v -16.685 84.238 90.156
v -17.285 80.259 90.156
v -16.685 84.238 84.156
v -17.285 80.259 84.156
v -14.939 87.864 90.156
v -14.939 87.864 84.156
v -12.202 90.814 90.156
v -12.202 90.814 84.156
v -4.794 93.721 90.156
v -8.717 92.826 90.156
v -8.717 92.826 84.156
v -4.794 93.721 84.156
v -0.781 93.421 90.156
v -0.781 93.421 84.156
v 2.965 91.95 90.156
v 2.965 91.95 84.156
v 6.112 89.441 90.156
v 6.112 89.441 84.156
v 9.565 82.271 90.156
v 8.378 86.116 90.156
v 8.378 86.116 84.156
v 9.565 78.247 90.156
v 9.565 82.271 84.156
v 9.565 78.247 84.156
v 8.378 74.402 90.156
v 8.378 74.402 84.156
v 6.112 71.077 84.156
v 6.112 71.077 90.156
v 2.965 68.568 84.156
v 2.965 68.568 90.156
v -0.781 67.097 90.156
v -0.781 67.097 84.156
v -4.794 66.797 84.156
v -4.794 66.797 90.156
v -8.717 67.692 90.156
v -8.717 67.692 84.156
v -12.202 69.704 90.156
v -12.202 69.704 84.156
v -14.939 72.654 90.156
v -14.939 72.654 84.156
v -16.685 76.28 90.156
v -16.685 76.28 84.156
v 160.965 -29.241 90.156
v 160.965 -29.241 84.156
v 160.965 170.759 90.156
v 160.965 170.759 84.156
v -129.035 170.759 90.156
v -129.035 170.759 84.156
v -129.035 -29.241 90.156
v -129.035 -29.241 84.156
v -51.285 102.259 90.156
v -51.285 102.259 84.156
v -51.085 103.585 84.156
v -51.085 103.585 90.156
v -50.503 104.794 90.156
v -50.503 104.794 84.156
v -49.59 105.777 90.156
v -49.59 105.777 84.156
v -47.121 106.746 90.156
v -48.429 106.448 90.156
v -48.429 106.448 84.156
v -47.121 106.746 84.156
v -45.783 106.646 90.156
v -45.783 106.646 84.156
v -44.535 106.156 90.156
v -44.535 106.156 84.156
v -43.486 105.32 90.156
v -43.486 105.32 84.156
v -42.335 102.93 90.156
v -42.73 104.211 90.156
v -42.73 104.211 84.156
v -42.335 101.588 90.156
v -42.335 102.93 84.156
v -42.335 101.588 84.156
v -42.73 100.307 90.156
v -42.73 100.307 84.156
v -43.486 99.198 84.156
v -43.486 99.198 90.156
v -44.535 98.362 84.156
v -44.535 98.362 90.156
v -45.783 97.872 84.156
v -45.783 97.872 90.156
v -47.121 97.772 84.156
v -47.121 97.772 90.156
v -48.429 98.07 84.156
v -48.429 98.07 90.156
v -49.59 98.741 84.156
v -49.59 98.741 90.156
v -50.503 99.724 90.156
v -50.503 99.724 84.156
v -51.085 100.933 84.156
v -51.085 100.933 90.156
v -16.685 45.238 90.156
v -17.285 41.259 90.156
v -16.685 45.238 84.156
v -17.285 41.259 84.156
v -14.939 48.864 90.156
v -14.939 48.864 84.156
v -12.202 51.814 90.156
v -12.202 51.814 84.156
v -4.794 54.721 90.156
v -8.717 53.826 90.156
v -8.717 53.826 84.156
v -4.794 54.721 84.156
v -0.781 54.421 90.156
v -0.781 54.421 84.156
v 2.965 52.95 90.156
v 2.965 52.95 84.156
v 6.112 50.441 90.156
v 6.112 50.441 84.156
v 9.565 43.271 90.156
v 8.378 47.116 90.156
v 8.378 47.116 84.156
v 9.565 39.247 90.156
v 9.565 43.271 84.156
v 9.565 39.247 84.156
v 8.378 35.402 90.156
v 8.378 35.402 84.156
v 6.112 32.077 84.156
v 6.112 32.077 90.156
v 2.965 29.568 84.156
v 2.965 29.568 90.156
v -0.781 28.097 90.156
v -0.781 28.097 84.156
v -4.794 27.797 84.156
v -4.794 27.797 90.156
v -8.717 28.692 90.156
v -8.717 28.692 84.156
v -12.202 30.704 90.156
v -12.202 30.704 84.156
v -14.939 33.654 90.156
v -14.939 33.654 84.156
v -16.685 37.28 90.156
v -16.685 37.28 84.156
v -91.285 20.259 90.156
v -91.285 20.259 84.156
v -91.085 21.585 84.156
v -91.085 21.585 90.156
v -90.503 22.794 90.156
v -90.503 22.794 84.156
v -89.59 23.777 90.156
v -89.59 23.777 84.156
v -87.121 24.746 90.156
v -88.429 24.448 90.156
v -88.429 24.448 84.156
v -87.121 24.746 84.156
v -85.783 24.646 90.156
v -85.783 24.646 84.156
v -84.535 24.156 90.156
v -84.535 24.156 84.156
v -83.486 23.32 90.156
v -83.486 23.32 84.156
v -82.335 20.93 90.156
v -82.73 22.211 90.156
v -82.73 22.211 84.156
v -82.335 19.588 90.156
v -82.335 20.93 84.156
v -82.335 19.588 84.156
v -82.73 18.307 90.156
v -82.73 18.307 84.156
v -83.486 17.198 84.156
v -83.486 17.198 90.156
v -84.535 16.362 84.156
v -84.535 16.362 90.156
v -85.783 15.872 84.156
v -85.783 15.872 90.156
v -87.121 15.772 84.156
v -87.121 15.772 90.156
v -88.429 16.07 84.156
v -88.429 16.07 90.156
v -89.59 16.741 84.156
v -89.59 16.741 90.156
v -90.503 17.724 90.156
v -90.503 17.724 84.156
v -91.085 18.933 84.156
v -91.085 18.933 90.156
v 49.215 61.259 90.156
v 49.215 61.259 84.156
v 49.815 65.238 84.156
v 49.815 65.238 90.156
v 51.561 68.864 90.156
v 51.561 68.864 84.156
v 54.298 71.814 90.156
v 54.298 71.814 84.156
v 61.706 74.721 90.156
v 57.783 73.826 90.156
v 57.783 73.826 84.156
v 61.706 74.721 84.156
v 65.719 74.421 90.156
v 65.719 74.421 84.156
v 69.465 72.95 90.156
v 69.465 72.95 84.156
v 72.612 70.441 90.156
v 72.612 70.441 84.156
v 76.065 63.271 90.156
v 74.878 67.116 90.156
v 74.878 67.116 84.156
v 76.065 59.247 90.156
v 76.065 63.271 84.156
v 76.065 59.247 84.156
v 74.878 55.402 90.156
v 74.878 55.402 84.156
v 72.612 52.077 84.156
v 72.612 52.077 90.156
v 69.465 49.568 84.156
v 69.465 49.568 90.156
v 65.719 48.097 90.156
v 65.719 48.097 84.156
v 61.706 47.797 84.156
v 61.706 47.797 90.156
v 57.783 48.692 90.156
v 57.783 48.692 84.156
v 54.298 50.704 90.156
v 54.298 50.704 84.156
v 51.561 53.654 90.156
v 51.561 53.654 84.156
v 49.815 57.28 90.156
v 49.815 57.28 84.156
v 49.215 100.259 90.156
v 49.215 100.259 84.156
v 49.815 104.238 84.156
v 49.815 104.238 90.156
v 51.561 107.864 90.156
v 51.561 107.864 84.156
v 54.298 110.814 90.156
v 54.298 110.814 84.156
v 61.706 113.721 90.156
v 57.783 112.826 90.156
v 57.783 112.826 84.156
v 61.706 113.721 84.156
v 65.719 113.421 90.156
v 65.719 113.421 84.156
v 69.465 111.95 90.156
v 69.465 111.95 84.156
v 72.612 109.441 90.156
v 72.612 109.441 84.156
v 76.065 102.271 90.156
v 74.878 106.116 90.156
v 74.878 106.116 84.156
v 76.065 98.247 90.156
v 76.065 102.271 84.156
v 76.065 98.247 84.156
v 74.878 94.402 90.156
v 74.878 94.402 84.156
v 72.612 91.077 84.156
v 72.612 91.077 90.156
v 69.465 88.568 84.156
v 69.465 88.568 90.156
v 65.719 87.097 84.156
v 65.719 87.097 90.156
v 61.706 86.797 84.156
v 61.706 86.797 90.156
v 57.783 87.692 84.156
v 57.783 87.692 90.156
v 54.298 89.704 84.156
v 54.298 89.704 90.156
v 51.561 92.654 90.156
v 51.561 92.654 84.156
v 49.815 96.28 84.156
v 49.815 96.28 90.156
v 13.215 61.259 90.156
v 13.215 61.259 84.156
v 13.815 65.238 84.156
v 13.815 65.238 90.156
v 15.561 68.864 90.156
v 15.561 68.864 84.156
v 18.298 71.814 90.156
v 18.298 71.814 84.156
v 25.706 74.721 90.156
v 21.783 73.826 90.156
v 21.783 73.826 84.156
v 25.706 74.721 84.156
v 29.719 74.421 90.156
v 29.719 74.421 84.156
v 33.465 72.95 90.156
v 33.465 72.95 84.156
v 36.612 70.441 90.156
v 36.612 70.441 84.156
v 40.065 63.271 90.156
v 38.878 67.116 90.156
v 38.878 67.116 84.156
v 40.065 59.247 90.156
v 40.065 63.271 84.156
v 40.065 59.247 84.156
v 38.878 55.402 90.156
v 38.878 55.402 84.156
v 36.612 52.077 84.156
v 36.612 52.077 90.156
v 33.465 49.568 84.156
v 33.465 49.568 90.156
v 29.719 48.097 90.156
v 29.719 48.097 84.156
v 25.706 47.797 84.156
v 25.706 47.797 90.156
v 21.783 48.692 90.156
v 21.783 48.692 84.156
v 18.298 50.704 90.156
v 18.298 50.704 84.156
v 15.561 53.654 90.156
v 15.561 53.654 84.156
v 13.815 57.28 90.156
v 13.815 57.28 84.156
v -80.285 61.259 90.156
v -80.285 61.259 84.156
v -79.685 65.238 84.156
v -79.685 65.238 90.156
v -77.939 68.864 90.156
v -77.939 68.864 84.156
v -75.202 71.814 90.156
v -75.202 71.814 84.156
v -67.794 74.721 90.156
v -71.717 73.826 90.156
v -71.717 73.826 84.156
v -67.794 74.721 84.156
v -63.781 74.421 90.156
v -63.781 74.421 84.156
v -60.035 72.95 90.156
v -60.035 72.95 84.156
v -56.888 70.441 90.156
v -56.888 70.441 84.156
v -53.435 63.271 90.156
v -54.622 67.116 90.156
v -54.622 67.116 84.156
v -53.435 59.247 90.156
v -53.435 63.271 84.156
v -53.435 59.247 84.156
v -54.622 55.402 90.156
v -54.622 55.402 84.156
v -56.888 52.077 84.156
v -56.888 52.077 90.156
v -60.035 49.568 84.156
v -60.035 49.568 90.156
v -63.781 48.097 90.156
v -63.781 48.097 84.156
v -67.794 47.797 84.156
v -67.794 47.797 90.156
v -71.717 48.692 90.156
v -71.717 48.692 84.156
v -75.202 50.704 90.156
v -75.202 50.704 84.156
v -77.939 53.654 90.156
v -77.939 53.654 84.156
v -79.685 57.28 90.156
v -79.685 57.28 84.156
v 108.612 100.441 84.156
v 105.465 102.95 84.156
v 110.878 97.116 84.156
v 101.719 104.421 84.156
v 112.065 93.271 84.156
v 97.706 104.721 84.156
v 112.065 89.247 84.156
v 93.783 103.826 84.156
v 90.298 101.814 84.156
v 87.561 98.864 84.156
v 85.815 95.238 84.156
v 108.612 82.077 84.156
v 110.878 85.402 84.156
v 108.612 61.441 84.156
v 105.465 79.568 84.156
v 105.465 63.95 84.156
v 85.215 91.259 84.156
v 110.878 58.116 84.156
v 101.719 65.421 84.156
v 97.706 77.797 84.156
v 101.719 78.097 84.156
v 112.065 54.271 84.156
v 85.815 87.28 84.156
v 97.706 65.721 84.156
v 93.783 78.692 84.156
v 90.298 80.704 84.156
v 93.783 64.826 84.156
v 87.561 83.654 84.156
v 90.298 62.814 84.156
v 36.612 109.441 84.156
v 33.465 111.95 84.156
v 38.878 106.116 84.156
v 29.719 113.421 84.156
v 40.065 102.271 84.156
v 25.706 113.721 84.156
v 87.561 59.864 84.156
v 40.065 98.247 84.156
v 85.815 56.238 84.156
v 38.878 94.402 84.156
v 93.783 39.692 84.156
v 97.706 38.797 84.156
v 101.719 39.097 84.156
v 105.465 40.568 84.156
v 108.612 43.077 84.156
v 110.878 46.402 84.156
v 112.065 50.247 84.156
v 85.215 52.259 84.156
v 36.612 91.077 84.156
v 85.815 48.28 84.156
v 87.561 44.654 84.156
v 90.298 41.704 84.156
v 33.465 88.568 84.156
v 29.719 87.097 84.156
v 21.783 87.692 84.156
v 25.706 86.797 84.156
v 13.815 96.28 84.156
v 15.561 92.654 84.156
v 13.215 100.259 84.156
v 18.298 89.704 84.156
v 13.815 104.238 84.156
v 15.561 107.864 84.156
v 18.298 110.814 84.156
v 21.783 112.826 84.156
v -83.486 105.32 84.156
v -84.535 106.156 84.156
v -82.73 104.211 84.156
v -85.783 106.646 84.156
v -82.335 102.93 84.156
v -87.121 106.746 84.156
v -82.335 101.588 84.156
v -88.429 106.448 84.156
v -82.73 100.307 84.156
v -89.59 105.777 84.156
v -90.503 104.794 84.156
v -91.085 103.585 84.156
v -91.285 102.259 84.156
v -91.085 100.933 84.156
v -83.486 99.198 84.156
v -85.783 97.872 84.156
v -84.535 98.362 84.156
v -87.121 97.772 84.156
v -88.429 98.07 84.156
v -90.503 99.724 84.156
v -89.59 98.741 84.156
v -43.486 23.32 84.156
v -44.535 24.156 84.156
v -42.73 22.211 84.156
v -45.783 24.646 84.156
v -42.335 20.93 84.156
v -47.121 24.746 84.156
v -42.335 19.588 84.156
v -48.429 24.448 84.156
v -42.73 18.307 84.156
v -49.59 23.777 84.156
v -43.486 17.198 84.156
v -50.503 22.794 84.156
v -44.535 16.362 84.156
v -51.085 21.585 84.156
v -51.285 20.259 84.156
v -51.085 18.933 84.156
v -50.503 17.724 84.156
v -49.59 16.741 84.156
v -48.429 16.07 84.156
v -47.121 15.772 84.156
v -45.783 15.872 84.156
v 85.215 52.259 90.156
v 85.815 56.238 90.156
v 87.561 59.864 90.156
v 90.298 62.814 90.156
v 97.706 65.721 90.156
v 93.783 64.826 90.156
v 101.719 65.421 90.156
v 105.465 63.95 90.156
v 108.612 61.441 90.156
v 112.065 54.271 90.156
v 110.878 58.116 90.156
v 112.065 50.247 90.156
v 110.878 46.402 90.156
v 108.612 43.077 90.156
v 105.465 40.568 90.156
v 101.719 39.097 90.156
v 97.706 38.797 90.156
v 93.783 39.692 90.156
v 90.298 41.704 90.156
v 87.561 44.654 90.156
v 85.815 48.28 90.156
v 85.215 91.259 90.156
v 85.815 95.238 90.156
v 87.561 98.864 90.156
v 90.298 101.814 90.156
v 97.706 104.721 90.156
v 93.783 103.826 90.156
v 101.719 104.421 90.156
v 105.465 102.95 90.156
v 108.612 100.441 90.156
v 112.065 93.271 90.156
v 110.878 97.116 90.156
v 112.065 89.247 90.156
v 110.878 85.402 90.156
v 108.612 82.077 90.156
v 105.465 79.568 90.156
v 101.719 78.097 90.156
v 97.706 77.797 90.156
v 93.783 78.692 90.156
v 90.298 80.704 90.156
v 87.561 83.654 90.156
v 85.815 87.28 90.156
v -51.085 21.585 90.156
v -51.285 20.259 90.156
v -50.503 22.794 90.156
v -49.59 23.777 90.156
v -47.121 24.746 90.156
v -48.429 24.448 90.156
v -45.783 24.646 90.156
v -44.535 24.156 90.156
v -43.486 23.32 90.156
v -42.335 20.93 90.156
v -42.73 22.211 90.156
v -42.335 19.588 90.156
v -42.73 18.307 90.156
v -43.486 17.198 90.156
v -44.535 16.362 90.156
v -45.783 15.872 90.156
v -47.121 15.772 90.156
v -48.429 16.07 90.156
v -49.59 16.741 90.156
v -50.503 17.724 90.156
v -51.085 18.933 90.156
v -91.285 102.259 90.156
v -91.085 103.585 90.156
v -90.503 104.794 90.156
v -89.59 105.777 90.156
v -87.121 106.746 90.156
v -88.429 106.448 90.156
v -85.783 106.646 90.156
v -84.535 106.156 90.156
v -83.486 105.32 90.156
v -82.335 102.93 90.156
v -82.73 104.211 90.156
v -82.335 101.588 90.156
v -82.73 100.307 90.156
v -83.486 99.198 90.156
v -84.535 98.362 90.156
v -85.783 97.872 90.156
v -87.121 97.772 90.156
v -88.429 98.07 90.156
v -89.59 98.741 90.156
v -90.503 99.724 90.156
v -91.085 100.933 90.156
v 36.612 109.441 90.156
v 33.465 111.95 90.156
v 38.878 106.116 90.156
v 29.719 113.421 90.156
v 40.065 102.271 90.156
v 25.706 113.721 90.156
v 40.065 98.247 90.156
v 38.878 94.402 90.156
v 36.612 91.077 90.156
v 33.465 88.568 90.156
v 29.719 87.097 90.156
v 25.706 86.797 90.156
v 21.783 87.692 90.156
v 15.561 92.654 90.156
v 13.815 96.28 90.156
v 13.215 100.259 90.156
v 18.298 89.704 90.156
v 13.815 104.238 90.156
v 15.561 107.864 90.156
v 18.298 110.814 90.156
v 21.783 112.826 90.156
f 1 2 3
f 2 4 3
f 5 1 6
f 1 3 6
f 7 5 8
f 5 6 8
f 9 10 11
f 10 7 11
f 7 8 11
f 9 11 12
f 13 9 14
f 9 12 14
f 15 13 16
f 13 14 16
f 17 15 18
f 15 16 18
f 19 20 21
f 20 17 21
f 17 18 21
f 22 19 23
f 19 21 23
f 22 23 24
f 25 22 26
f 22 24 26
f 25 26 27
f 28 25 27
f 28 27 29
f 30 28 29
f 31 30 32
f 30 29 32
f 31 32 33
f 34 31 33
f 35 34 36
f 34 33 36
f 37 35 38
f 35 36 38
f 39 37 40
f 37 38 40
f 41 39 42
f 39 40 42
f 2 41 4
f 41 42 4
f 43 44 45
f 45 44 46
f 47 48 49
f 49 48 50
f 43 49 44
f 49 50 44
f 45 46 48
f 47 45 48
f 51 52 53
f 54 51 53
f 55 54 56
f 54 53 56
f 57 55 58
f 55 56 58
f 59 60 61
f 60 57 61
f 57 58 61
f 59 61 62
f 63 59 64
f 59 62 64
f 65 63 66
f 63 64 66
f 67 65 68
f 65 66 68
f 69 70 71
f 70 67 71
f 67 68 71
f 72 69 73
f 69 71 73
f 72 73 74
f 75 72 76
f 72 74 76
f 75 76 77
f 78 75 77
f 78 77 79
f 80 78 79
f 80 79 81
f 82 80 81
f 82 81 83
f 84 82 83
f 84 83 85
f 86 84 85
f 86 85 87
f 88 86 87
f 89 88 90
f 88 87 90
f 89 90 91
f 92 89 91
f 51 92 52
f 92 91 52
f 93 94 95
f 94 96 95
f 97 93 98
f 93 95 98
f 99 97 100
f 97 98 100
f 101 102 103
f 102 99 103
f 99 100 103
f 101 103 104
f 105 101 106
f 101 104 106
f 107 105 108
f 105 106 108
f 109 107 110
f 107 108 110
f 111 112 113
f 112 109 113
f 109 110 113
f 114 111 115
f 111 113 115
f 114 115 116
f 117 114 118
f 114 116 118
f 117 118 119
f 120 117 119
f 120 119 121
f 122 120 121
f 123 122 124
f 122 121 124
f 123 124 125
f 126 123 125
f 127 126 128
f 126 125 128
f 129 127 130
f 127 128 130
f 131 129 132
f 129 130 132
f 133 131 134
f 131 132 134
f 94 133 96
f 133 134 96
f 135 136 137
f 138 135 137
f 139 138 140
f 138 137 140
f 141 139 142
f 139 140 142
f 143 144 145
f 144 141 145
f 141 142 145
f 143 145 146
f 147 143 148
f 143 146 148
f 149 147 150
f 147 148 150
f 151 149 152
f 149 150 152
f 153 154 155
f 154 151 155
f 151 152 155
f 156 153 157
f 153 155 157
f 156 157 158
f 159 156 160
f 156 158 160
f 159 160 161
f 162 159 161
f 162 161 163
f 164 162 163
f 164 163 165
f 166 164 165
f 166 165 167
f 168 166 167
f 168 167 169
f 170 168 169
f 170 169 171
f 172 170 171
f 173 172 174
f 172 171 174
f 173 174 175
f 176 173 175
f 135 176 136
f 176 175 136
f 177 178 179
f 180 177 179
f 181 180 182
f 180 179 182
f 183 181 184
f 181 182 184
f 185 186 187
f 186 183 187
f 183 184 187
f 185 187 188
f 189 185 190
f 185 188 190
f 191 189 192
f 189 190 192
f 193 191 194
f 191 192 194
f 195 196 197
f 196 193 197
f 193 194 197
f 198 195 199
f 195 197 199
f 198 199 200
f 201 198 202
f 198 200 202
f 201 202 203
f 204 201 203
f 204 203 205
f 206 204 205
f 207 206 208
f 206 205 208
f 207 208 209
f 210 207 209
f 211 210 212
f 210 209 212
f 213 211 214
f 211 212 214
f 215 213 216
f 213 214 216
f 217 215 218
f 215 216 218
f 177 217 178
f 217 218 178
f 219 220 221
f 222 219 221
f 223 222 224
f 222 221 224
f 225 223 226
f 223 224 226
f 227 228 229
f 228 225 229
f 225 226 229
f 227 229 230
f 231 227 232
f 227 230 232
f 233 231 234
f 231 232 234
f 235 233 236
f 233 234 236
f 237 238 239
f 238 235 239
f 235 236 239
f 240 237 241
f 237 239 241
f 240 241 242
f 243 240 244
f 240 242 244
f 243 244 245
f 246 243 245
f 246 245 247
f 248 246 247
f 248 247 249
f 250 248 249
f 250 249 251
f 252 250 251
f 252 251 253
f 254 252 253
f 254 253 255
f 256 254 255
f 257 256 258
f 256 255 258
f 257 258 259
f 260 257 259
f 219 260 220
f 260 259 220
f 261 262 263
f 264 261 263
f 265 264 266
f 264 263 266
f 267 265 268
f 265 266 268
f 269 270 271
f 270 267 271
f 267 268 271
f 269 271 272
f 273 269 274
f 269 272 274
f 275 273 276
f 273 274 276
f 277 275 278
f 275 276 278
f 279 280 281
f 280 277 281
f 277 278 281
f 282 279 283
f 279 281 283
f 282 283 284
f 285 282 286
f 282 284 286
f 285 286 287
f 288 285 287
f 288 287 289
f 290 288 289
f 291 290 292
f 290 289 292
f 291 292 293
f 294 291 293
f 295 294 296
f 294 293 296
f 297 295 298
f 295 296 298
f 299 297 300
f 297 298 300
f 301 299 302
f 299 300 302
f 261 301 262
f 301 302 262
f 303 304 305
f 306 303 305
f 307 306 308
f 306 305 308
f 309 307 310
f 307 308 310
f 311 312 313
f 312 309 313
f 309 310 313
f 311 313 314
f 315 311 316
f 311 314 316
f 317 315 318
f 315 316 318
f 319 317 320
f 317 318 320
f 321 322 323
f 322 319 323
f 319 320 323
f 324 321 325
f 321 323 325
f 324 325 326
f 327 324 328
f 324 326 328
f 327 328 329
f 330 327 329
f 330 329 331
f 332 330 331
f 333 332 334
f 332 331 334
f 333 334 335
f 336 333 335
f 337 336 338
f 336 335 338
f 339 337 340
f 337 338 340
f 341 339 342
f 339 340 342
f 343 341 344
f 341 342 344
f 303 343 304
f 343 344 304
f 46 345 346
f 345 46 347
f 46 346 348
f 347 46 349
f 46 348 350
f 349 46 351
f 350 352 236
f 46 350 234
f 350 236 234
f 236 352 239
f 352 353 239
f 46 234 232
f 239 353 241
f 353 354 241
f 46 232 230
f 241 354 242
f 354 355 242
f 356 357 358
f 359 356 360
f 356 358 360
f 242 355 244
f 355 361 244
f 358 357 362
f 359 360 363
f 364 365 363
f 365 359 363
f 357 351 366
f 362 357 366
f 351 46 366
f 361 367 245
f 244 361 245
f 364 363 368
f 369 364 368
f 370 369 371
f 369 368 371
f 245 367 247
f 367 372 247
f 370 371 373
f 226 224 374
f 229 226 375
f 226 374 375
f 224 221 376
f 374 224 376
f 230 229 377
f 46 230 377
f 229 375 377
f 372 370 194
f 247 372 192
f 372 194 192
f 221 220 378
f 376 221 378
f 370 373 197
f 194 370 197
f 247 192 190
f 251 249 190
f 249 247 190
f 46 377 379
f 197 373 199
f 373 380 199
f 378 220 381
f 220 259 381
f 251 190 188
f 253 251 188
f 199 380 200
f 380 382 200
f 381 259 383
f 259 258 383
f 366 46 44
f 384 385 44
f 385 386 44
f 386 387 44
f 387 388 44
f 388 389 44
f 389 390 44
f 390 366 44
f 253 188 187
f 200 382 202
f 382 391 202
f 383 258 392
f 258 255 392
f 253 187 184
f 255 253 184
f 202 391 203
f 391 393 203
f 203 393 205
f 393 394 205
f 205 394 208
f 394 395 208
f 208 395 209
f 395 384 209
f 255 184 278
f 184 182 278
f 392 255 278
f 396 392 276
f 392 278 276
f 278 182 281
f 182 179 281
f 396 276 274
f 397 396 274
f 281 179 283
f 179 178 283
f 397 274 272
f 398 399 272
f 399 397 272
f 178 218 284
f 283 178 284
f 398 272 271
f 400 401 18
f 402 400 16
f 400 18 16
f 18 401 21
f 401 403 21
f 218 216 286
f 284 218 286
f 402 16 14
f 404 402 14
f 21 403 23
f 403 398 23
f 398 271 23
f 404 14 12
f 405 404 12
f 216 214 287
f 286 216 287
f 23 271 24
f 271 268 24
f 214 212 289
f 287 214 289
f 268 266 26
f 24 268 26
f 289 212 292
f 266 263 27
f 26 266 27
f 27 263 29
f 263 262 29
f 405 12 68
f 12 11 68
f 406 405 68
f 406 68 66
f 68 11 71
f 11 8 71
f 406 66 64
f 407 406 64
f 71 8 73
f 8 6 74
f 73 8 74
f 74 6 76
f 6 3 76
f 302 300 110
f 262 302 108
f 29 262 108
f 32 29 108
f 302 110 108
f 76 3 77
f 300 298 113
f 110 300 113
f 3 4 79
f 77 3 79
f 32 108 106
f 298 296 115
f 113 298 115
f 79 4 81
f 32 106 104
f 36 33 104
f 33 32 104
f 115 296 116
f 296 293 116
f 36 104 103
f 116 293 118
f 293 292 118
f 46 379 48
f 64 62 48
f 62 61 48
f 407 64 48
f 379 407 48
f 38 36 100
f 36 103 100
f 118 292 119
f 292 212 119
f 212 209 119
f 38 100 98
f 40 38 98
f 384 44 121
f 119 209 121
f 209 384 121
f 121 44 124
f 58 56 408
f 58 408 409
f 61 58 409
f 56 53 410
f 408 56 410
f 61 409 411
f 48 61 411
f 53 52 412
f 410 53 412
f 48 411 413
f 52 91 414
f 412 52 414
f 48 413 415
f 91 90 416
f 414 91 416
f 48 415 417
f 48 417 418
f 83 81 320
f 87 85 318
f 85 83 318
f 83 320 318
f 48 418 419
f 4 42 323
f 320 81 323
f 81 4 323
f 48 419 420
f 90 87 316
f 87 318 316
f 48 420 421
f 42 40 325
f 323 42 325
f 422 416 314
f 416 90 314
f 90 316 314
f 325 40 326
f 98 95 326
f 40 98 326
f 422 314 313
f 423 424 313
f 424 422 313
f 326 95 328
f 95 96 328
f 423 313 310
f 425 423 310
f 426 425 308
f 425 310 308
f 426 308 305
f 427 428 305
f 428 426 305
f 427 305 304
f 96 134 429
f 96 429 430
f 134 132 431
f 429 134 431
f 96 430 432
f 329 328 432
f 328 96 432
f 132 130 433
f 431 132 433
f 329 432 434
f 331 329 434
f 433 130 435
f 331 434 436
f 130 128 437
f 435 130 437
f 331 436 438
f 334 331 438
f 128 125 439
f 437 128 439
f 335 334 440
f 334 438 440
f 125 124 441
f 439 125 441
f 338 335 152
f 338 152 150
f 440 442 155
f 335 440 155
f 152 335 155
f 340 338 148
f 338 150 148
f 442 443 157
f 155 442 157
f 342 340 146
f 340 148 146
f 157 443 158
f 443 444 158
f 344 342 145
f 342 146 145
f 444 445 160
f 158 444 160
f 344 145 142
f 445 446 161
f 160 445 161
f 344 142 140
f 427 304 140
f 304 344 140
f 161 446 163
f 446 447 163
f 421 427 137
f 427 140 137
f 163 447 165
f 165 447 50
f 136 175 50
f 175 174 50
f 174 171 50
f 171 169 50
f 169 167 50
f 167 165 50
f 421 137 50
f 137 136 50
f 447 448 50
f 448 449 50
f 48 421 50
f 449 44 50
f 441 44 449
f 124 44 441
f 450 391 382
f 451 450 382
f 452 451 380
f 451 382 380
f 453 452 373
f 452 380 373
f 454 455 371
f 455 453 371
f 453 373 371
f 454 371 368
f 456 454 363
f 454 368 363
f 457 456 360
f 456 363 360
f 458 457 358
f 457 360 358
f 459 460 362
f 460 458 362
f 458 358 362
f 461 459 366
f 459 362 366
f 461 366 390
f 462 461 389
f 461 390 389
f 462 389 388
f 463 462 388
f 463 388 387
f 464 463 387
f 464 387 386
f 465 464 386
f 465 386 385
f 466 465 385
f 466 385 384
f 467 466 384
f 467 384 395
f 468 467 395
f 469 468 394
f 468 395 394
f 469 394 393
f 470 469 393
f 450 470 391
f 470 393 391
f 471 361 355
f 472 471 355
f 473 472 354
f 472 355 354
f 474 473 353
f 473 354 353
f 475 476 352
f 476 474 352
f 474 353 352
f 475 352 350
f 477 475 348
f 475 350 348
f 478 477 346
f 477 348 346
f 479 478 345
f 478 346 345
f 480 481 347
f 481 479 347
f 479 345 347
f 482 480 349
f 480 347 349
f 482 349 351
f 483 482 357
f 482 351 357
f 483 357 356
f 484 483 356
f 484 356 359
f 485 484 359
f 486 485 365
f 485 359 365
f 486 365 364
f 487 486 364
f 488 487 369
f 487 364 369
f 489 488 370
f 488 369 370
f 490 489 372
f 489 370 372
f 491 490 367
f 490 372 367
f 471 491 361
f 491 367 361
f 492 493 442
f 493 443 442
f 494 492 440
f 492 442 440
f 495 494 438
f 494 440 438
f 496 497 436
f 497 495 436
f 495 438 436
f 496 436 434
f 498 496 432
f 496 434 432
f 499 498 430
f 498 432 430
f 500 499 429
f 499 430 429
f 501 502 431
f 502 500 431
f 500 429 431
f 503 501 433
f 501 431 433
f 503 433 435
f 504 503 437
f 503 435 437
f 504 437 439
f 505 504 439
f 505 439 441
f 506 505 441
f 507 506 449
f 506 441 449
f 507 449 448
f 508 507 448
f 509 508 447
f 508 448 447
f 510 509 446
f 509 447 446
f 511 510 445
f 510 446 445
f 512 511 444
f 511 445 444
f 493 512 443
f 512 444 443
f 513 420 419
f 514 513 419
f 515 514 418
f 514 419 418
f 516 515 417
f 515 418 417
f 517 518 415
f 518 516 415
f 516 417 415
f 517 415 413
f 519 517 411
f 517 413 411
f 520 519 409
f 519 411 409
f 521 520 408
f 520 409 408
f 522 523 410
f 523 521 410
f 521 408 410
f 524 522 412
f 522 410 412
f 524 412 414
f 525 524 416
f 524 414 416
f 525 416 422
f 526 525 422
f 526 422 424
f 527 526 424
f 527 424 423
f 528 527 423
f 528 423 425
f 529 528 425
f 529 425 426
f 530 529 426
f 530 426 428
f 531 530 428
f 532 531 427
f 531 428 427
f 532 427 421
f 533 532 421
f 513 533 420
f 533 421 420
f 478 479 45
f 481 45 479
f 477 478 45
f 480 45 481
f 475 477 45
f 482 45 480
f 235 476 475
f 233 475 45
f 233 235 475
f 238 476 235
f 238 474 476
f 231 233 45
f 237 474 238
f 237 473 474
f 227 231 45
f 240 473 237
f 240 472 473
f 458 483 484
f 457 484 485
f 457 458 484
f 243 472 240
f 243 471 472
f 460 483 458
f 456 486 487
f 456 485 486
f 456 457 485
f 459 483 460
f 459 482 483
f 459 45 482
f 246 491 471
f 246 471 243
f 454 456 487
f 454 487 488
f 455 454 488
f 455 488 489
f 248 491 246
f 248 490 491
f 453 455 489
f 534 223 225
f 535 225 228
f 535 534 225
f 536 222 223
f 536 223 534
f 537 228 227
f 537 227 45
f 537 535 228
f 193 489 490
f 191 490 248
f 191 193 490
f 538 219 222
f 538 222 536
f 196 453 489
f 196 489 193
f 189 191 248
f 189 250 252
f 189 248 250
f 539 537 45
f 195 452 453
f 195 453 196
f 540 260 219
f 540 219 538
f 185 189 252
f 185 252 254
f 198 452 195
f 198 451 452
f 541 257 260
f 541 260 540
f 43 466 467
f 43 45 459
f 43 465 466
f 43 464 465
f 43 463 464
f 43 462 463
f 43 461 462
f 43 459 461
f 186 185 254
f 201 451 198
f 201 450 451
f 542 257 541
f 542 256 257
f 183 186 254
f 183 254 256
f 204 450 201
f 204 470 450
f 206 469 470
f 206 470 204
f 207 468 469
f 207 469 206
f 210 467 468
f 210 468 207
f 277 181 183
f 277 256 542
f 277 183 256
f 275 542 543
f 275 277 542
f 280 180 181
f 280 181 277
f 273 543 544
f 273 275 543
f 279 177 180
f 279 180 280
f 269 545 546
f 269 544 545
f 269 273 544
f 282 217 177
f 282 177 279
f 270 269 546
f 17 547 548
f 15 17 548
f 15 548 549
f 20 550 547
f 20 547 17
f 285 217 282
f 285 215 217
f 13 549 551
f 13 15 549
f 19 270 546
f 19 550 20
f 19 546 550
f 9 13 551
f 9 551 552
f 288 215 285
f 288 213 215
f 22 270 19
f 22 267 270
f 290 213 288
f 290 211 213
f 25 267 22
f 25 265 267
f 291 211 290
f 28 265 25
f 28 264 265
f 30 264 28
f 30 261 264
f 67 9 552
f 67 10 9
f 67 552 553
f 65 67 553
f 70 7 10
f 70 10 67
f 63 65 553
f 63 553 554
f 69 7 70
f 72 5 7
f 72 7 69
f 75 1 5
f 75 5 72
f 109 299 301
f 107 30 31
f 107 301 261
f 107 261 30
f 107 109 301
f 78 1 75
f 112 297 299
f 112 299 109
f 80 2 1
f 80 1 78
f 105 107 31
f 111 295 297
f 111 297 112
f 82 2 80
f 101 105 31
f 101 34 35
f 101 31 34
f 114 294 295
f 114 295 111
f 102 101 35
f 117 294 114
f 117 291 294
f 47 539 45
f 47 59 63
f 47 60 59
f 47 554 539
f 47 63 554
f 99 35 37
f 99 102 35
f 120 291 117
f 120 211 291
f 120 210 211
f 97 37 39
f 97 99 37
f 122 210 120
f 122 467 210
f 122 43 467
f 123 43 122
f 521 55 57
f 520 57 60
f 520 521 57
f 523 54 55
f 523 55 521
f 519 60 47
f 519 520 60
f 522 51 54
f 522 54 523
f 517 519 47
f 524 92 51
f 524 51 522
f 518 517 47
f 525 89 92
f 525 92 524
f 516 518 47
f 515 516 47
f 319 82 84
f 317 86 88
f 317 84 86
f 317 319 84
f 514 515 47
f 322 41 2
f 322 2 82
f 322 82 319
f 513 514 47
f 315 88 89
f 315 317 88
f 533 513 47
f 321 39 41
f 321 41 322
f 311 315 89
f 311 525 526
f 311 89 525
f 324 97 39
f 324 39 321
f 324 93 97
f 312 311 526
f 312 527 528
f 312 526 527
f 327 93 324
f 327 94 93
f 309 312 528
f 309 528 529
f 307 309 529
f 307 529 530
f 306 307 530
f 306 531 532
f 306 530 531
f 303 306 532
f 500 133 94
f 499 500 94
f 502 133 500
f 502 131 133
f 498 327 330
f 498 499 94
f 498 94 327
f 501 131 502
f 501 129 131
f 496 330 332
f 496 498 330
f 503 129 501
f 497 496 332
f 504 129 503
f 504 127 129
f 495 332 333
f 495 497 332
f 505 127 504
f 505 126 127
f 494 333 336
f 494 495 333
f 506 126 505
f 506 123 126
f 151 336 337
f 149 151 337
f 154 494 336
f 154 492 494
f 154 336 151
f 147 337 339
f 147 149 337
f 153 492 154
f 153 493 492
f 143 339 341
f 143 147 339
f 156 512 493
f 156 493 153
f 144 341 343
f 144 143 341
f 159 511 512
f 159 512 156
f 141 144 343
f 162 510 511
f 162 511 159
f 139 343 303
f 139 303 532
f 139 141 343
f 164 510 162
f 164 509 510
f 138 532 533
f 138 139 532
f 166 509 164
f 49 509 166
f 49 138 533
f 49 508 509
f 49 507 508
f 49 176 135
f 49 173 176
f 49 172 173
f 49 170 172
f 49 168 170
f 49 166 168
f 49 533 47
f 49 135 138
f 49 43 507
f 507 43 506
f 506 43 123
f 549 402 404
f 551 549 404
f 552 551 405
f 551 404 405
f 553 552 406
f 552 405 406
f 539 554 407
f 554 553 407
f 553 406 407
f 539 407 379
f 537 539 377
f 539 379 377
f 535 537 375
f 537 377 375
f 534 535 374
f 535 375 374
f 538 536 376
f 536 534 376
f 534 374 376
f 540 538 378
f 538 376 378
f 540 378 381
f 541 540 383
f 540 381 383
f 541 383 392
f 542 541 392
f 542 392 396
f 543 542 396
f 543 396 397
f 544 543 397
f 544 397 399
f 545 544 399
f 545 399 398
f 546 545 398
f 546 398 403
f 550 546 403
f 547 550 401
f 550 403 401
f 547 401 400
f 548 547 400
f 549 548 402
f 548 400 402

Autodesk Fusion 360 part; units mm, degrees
sketch "Sketch1" plane through (0, 0, 84.1556) normal (0, 0, 1) x (-1, 0, 0)
  circle A0 centre (86.7847, -20.259) radius 4.5
  circle A1 centre (-26.7153, -100.259) radius 13.5
  circle A2 centre (-98.7153, -52.259) radius 13.5
  circle A3 centre (-26.7153, -61.259) radius 13.5
  circle A4 centre (-62.7153, -100.259) radius 13.5
  circle A5 centre (46.7847, -20.259) radius 4.5
  circle A6 centre (46.7847, -102.259) radius 4.5
  circle A7 centre (3.7847, -80.259) radius 13.5
  circle A8 centre (-62.7153, -61.259) radius 13.5
  circle A9 centre (3.7847, -41.259) radius 13.5
  circle A10 centre (-98.7153, -91.259) radius 13.5
  circle A11 centre (66.7847, -61.259) radius 13.5
  circle A12 centre (86.7847, -102.259) radius 4.5
  line L0 (129.0347, 29.241) -> (-160.9653, 29.241)
  line L1 (-160.9653, 29.241) -> (-160.9653, -170.759)
  line L2 (-160.9653, -170.759) -> (129.0347, -170.759)
  line L3 (129.0347, -170.759) -> (129.0347, 29.241)
  circle A13 centre (66.7847, -61.259) radius 13.5
  circle A14 centre (86.7847, -102.259) radius 4.5
  circle A15 centre (46.7847, -102.259) radius 4.5
  circle A16 centre (86.7847, -20.259) radius 4.5
  circle A17 centre (46.7847, -20.259) radius 4.5
  circle A18 centre (3.7847, -41.259) radius 13.5
  circle A19 centre (3.7847, -80.259) radius 13.5
  circle A20 centre (-26.7153, -61.259) radius 13.5
  circle A21 centre (-26.7153, -100.259) radius 13.5
  circle A22 centre (-62.7153, -100.259) radius 13.5
  circle A23 centre (-62.7153, -61.259) radius 13.5
  circle A24 centre (-98.7153, -52.259) radius 13.5
  circle A25 centre (-98.7153, -91.259) radius 13.5
extrude "Extrude1" add sketch "Sketch1" along normal blind 6
equation "d148 = mat_thickness_6"
equation "mat_thickness_6 = 6 mm"
